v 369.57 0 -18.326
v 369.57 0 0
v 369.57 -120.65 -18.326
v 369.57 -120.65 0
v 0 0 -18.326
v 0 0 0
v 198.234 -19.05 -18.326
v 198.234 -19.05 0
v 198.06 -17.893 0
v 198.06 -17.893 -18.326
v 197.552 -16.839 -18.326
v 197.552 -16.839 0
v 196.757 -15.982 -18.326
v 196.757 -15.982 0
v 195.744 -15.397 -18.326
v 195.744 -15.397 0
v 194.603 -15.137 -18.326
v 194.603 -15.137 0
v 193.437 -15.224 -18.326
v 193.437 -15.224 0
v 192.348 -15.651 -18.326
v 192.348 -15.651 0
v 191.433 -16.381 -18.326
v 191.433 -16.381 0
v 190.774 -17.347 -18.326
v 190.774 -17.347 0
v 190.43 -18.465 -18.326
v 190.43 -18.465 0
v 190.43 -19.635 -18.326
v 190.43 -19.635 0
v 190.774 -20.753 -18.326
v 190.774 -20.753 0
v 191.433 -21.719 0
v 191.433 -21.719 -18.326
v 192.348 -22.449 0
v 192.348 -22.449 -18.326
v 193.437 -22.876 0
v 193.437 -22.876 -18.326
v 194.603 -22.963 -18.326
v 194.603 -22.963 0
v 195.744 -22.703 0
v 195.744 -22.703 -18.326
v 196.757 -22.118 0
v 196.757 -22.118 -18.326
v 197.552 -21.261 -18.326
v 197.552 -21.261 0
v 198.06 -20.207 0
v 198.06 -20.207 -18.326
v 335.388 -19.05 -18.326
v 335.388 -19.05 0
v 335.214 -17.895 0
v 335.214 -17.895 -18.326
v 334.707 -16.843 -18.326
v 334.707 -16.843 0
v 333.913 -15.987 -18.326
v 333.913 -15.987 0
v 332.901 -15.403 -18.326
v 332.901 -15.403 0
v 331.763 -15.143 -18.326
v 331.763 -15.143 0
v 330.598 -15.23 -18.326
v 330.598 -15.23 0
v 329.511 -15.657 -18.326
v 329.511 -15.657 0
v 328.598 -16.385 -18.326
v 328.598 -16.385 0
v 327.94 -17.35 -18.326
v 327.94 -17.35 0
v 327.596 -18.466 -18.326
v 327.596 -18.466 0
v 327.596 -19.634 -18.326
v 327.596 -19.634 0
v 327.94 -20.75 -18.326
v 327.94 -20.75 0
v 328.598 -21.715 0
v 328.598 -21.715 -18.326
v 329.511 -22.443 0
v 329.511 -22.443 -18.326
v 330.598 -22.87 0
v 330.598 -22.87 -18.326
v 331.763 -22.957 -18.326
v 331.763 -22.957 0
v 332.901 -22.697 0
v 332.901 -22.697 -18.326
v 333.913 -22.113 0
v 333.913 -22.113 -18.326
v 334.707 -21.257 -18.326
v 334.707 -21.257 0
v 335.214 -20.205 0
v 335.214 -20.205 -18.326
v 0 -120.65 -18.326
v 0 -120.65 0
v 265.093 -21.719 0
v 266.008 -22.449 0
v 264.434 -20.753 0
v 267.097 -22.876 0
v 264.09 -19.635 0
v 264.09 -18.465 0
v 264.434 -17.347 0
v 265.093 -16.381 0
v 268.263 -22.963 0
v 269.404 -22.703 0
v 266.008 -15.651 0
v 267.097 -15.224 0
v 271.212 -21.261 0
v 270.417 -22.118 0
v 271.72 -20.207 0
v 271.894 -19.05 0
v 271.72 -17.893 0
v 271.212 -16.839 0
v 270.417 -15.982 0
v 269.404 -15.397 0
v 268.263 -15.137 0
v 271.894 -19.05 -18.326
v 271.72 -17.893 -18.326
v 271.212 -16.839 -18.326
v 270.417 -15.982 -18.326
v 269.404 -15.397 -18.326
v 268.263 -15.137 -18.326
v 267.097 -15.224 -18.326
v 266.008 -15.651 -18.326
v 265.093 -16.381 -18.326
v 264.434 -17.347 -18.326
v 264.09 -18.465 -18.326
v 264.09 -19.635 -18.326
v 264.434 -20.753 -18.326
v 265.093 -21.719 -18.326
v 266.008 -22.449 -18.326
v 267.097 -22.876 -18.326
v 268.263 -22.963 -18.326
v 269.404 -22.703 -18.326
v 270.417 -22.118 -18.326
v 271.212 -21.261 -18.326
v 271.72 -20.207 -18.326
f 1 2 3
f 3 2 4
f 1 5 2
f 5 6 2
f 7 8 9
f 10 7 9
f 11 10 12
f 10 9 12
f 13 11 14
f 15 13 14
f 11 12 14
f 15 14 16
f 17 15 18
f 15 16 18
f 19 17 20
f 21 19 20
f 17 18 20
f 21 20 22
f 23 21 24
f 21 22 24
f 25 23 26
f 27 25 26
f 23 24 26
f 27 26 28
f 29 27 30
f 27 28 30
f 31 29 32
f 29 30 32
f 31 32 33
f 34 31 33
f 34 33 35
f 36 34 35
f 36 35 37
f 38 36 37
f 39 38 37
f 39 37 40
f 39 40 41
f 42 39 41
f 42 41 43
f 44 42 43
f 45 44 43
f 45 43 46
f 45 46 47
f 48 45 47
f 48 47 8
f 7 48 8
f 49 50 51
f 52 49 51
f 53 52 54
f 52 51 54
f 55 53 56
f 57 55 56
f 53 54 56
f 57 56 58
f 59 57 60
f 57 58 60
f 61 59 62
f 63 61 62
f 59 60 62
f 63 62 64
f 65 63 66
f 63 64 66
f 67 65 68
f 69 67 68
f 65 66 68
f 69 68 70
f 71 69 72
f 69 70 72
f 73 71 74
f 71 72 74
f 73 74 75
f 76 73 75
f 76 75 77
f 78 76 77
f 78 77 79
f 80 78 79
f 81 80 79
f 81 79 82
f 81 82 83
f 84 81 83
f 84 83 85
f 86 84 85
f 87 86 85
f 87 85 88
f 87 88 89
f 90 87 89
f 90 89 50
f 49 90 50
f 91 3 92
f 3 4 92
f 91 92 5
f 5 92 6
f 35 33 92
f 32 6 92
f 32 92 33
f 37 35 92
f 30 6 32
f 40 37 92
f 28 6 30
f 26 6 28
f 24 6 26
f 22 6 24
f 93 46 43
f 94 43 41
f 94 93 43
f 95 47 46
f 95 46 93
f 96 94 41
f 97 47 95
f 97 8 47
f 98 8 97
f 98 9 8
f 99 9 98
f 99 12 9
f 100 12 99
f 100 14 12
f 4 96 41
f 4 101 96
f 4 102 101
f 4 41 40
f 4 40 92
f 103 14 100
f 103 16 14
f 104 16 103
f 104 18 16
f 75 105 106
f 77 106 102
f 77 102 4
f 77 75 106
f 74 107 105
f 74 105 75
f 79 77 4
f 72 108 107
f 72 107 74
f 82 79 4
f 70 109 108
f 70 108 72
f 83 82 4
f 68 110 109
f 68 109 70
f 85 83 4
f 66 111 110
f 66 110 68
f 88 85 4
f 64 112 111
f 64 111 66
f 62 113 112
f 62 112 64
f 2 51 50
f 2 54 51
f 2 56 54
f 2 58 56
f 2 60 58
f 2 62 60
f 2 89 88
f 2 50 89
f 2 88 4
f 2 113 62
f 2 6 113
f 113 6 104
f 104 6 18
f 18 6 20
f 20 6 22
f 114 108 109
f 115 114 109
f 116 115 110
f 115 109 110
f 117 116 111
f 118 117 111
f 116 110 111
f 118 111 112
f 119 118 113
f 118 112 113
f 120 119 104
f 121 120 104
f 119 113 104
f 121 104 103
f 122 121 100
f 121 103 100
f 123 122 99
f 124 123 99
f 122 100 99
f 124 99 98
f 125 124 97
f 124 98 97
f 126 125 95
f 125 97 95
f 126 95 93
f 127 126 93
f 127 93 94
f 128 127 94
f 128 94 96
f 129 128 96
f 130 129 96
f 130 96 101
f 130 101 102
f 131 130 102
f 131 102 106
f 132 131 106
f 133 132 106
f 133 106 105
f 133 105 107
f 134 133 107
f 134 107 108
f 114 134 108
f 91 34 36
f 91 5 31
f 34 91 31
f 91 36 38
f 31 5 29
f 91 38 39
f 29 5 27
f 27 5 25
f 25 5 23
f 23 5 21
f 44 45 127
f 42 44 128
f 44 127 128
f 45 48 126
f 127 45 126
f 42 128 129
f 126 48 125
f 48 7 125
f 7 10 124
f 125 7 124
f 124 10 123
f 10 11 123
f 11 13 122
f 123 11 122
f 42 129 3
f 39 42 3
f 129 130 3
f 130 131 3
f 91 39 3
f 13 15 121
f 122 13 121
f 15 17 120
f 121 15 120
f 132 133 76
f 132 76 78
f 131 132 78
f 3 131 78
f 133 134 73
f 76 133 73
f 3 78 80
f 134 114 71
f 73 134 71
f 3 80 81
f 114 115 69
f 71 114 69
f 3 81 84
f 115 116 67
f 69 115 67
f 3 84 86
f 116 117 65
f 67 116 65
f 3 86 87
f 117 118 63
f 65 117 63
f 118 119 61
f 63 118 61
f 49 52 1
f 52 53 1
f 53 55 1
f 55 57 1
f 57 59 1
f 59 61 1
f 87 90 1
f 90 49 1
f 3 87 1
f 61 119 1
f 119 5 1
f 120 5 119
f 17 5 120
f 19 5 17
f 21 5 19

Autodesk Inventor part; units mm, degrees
ref_plane "YZ Plane" through (0, 0, 0) normal (1, 0, 0) x (0, 1, 0)
ref_plane "XZ Plane" through (0, 0, 0) normal (0, 1, 0) x (-1, 0, 0)
ref_plane "XY Plane" through (0, 0, 0) normal (0, 0, 1) x (1, 0, 0)
sketch "Sketch1" plane through (0, 0, 0) normal (0, 0, 1) x (1, 0, 0)
  line L0 (0, 0) -> (369.57, 0)
  line L1 (369.57, 0) -> (369.57, -120.65)
  line L2 (369.57, -120.65) -> (0, -120.65)
  line L3 (0, -120.65) -> (0, 0)
  circle A0 centre (331.47, -19.05) radius 3.9179
  circle A1 centre (267.97, -19.05) radius 3.9243
  circle A2 centre (194.31, -19.05) radius 3.9243
  dimension "d0" = 369.57
  dimension "d1" = 120.65
  dimension "d2" = 7.8359
  dimension "d3" = 38.1
  dimension "d4" = 101.6
  dimension "d5" = 7.8486
  dimension "d6" = 101.6
  dimension "d7" = 63.5
  dimension "d8" = 7.8486
  dimension "d9" = 101.6
  dimension "d10" = 73.66
extrude "Extrusion1" add sketch "Sketch1" against normal blind 18.3261
properties part number "Kermit bumper Medium"
